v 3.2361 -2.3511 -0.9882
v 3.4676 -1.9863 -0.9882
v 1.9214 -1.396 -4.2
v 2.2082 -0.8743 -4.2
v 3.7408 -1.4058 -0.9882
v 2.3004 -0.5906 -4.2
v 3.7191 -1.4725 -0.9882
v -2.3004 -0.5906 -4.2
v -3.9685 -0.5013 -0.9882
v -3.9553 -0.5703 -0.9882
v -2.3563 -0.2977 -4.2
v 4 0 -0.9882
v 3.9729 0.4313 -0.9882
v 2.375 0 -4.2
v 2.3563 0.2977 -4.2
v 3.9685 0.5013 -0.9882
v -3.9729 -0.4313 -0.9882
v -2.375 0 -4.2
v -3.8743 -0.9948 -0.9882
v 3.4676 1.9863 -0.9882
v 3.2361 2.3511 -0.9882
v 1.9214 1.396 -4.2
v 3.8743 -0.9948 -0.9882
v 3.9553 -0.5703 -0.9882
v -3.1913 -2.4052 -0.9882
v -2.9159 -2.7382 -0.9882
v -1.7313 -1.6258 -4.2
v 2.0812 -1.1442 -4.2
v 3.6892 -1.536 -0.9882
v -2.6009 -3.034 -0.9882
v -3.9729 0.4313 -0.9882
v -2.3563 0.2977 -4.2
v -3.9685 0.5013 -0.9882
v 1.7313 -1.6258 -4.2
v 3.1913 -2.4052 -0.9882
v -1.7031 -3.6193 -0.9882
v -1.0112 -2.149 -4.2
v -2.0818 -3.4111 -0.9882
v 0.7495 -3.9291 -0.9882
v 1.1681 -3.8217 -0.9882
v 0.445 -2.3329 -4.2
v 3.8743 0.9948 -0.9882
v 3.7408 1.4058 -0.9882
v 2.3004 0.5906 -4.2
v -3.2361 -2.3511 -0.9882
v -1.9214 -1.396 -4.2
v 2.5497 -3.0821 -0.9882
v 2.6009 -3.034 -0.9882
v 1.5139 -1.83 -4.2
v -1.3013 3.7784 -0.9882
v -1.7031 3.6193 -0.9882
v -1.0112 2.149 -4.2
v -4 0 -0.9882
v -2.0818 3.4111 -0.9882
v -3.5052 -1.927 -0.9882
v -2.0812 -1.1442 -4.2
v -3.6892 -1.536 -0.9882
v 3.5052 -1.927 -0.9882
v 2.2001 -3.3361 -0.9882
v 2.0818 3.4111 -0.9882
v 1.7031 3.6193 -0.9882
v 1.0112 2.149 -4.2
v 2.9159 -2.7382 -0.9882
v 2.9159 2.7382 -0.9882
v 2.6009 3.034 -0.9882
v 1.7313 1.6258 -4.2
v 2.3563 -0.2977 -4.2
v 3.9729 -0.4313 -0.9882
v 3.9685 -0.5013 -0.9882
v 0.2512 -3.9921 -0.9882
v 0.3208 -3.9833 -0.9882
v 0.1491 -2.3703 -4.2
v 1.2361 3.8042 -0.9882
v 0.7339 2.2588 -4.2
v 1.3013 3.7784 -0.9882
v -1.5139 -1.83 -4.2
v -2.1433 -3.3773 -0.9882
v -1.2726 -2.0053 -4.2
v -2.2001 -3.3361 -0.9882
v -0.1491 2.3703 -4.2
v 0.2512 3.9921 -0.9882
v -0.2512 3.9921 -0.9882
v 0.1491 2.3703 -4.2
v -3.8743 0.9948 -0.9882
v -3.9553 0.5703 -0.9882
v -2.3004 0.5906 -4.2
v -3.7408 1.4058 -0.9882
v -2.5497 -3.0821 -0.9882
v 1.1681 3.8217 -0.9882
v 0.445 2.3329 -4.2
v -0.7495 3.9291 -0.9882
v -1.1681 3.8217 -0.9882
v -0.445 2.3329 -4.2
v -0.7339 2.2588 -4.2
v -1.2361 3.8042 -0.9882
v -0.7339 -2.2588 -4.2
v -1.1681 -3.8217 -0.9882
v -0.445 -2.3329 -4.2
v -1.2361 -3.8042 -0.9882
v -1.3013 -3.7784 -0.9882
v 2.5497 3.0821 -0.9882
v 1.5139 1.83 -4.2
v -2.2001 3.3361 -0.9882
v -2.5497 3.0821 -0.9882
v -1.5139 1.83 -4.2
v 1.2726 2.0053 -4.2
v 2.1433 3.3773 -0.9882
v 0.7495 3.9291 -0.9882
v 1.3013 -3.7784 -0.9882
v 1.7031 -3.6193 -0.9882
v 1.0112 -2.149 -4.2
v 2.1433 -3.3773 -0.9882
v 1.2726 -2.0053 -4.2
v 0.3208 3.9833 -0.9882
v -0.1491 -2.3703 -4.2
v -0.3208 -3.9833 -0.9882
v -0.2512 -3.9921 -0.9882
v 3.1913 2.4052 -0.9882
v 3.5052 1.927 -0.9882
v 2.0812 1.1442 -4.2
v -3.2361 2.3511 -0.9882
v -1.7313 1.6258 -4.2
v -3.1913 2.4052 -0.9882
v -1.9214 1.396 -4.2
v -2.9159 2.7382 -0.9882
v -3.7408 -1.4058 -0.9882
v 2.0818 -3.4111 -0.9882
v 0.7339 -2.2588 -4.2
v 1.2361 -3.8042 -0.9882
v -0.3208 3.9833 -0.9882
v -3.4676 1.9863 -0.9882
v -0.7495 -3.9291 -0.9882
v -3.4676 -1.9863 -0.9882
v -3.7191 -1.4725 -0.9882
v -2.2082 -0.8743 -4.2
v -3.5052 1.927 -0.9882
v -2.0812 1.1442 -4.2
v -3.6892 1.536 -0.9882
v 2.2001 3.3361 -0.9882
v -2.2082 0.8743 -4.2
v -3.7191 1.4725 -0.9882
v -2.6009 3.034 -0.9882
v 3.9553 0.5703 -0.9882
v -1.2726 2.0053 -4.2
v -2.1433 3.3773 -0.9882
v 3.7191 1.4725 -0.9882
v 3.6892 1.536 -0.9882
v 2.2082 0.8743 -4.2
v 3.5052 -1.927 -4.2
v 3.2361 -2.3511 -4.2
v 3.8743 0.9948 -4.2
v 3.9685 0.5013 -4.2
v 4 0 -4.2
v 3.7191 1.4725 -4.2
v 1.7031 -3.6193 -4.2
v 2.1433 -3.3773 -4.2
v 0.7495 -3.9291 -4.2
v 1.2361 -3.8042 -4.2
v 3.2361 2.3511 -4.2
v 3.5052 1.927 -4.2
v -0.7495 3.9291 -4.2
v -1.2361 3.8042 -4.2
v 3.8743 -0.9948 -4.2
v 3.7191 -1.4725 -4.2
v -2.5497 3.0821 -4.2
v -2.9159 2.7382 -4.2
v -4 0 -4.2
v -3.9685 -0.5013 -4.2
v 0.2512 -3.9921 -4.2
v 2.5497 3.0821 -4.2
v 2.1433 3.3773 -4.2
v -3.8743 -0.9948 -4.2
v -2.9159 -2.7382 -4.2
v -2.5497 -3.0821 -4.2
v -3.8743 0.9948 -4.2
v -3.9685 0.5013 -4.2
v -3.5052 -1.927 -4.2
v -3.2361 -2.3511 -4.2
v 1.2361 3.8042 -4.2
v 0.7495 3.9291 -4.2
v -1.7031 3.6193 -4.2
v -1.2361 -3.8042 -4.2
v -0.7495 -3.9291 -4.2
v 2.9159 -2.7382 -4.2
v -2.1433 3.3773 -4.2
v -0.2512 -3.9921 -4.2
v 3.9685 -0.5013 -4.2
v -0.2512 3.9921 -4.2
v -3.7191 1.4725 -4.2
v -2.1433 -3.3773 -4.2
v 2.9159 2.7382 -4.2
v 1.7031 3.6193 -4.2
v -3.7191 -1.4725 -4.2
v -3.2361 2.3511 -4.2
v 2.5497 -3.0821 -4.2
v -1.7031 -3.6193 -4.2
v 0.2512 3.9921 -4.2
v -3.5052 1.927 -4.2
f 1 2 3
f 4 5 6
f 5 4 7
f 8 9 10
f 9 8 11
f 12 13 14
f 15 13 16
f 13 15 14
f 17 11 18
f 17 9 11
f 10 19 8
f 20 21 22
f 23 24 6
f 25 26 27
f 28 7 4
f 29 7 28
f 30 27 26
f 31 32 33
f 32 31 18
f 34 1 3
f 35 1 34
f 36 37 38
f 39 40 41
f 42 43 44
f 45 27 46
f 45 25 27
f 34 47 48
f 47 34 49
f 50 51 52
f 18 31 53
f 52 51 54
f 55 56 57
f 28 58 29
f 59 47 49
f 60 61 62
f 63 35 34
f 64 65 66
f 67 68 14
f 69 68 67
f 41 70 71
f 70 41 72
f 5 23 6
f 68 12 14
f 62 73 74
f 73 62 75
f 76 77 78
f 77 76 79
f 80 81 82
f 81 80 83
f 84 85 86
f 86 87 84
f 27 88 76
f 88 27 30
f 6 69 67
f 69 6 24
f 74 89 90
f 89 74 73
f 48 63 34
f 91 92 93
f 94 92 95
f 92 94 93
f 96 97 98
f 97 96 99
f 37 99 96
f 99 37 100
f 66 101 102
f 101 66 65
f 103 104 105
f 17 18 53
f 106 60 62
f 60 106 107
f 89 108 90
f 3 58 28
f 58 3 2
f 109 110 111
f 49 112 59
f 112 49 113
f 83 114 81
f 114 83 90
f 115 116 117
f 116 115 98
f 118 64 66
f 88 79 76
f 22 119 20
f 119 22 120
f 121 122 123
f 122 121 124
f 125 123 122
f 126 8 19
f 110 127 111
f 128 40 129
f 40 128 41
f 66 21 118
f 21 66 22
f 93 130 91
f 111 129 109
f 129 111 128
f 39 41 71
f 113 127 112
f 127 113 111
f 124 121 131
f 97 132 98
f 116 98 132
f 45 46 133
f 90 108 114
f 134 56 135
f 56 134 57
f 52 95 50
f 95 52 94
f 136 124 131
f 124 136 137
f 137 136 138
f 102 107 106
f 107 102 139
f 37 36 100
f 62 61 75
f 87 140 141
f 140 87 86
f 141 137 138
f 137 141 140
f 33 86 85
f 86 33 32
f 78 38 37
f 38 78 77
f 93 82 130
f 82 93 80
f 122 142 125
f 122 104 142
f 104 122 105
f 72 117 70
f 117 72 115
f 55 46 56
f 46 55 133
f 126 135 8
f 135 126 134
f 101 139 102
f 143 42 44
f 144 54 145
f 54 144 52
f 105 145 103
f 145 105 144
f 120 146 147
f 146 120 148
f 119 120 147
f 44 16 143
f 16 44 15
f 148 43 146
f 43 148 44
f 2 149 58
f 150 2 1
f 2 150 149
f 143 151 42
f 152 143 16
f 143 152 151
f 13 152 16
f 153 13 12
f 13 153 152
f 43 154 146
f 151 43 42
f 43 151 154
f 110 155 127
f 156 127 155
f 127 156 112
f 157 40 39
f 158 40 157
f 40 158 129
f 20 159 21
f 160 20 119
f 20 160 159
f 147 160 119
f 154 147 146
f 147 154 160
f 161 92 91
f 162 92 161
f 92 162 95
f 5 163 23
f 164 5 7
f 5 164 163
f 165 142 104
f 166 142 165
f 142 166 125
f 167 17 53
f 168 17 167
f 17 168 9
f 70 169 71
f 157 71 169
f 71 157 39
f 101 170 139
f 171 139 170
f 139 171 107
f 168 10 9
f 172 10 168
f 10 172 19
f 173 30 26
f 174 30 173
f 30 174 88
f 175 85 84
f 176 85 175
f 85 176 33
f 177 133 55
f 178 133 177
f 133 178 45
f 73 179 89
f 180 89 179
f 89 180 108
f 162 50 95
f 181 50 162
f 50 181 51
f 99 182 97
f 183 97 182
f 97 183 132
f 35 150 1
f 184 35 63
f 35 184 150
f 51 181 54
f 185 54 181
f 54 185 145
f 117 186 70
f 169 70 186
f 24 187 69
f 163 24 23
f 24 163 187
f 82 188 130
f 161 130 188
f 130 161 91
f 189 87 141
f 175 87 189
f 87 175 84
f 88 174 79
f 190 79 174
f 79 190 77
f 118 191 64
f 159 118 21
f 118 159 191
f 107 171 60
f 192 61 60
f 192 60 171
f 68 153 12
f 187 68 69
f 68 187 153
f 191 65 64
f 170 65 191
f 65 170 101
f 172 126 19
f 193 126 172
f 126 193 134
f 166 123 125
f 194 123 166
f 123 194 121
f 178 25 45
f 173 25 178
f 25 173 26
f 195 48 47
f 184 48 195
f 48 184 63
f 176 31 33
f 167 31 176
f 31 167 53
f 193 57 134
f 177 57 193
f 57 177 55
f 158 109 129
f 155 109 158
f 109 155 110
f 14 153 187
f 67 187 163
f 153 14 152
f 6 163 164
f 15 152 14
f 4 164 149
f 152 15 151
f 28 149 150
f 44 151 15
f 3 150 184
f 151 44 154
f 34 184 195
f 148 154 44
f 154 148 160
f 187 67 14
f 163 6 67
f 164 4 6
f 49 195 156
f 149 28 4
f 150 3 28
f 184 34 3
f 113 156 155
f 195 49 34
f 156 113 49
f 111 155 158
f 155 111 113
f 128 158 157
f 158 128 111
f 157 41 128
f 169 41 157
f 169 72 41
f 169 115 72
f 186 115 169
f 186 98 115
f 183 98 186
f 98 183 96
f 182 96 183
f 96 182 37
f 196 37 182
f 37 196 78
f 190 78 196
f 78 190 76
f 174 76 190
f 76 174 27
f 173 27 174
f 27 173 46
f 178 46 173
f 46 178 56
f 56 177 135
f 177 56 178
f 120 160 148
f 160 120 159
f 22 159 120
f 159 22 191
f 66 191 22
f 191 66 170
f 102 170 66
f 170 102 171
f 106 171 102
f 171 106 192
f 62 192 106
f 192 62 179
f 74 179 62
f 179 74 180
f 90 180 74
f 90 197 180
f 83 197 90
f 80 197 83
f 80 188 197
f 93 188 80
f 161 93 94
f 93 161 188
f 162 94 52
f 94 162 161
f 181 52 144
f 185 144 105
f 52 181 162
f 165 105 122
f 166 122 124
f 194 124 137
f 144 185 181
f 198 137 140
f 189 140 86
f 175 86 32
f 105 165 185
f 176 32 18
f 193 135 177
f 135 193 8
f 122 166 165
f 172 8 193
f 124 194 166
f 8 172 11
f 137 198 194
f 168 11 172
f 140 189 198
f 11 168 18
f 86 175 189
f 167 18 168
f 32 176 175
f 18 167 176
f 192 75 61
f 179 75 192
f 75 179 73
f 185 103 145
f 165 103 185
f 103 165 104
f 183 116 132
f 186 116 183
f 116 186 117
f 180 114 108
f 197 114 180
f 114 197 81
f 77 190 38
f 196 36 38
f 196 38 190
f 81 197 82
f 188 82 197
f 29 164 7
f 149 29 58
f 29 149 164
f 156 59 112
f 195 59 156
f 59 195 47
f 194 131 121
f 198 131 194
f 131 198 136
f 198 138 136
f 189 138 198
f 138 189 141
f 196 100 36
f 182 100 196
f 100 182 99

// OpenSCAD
$fn = 50;

difference() {
	union() {
		translate(v = [0, 0, -4.2]) {
			cylinder(h = 7.2, r = 4.0);
		}
	}
	union() {
		translate(v = [0, 0, 0]) {
			rotate(a = [0, 0, 0]) {
				difference() {
					union() {
						translate(v = [0, 0, -7.2]) {
							cylinder(h = 7.2, r = 2.25);
						}
						translate(v = [0, 0, -4.2]) {
							cylinder(h = 4.2, r1 = 2.375, r2 = 4.5);
						}
						translate(v = [0, 0, -7.2]) {
							cylinder(h = 7.2, r = 2.375);
						}
						translate(v = [0, 0, -7.2]) {
							cylinder(h = 7.2, r = 2.25);
						}
					}
					union();
				}
			}
		}
		#cylinder(h = 3, r = 5.0);
	}
}
